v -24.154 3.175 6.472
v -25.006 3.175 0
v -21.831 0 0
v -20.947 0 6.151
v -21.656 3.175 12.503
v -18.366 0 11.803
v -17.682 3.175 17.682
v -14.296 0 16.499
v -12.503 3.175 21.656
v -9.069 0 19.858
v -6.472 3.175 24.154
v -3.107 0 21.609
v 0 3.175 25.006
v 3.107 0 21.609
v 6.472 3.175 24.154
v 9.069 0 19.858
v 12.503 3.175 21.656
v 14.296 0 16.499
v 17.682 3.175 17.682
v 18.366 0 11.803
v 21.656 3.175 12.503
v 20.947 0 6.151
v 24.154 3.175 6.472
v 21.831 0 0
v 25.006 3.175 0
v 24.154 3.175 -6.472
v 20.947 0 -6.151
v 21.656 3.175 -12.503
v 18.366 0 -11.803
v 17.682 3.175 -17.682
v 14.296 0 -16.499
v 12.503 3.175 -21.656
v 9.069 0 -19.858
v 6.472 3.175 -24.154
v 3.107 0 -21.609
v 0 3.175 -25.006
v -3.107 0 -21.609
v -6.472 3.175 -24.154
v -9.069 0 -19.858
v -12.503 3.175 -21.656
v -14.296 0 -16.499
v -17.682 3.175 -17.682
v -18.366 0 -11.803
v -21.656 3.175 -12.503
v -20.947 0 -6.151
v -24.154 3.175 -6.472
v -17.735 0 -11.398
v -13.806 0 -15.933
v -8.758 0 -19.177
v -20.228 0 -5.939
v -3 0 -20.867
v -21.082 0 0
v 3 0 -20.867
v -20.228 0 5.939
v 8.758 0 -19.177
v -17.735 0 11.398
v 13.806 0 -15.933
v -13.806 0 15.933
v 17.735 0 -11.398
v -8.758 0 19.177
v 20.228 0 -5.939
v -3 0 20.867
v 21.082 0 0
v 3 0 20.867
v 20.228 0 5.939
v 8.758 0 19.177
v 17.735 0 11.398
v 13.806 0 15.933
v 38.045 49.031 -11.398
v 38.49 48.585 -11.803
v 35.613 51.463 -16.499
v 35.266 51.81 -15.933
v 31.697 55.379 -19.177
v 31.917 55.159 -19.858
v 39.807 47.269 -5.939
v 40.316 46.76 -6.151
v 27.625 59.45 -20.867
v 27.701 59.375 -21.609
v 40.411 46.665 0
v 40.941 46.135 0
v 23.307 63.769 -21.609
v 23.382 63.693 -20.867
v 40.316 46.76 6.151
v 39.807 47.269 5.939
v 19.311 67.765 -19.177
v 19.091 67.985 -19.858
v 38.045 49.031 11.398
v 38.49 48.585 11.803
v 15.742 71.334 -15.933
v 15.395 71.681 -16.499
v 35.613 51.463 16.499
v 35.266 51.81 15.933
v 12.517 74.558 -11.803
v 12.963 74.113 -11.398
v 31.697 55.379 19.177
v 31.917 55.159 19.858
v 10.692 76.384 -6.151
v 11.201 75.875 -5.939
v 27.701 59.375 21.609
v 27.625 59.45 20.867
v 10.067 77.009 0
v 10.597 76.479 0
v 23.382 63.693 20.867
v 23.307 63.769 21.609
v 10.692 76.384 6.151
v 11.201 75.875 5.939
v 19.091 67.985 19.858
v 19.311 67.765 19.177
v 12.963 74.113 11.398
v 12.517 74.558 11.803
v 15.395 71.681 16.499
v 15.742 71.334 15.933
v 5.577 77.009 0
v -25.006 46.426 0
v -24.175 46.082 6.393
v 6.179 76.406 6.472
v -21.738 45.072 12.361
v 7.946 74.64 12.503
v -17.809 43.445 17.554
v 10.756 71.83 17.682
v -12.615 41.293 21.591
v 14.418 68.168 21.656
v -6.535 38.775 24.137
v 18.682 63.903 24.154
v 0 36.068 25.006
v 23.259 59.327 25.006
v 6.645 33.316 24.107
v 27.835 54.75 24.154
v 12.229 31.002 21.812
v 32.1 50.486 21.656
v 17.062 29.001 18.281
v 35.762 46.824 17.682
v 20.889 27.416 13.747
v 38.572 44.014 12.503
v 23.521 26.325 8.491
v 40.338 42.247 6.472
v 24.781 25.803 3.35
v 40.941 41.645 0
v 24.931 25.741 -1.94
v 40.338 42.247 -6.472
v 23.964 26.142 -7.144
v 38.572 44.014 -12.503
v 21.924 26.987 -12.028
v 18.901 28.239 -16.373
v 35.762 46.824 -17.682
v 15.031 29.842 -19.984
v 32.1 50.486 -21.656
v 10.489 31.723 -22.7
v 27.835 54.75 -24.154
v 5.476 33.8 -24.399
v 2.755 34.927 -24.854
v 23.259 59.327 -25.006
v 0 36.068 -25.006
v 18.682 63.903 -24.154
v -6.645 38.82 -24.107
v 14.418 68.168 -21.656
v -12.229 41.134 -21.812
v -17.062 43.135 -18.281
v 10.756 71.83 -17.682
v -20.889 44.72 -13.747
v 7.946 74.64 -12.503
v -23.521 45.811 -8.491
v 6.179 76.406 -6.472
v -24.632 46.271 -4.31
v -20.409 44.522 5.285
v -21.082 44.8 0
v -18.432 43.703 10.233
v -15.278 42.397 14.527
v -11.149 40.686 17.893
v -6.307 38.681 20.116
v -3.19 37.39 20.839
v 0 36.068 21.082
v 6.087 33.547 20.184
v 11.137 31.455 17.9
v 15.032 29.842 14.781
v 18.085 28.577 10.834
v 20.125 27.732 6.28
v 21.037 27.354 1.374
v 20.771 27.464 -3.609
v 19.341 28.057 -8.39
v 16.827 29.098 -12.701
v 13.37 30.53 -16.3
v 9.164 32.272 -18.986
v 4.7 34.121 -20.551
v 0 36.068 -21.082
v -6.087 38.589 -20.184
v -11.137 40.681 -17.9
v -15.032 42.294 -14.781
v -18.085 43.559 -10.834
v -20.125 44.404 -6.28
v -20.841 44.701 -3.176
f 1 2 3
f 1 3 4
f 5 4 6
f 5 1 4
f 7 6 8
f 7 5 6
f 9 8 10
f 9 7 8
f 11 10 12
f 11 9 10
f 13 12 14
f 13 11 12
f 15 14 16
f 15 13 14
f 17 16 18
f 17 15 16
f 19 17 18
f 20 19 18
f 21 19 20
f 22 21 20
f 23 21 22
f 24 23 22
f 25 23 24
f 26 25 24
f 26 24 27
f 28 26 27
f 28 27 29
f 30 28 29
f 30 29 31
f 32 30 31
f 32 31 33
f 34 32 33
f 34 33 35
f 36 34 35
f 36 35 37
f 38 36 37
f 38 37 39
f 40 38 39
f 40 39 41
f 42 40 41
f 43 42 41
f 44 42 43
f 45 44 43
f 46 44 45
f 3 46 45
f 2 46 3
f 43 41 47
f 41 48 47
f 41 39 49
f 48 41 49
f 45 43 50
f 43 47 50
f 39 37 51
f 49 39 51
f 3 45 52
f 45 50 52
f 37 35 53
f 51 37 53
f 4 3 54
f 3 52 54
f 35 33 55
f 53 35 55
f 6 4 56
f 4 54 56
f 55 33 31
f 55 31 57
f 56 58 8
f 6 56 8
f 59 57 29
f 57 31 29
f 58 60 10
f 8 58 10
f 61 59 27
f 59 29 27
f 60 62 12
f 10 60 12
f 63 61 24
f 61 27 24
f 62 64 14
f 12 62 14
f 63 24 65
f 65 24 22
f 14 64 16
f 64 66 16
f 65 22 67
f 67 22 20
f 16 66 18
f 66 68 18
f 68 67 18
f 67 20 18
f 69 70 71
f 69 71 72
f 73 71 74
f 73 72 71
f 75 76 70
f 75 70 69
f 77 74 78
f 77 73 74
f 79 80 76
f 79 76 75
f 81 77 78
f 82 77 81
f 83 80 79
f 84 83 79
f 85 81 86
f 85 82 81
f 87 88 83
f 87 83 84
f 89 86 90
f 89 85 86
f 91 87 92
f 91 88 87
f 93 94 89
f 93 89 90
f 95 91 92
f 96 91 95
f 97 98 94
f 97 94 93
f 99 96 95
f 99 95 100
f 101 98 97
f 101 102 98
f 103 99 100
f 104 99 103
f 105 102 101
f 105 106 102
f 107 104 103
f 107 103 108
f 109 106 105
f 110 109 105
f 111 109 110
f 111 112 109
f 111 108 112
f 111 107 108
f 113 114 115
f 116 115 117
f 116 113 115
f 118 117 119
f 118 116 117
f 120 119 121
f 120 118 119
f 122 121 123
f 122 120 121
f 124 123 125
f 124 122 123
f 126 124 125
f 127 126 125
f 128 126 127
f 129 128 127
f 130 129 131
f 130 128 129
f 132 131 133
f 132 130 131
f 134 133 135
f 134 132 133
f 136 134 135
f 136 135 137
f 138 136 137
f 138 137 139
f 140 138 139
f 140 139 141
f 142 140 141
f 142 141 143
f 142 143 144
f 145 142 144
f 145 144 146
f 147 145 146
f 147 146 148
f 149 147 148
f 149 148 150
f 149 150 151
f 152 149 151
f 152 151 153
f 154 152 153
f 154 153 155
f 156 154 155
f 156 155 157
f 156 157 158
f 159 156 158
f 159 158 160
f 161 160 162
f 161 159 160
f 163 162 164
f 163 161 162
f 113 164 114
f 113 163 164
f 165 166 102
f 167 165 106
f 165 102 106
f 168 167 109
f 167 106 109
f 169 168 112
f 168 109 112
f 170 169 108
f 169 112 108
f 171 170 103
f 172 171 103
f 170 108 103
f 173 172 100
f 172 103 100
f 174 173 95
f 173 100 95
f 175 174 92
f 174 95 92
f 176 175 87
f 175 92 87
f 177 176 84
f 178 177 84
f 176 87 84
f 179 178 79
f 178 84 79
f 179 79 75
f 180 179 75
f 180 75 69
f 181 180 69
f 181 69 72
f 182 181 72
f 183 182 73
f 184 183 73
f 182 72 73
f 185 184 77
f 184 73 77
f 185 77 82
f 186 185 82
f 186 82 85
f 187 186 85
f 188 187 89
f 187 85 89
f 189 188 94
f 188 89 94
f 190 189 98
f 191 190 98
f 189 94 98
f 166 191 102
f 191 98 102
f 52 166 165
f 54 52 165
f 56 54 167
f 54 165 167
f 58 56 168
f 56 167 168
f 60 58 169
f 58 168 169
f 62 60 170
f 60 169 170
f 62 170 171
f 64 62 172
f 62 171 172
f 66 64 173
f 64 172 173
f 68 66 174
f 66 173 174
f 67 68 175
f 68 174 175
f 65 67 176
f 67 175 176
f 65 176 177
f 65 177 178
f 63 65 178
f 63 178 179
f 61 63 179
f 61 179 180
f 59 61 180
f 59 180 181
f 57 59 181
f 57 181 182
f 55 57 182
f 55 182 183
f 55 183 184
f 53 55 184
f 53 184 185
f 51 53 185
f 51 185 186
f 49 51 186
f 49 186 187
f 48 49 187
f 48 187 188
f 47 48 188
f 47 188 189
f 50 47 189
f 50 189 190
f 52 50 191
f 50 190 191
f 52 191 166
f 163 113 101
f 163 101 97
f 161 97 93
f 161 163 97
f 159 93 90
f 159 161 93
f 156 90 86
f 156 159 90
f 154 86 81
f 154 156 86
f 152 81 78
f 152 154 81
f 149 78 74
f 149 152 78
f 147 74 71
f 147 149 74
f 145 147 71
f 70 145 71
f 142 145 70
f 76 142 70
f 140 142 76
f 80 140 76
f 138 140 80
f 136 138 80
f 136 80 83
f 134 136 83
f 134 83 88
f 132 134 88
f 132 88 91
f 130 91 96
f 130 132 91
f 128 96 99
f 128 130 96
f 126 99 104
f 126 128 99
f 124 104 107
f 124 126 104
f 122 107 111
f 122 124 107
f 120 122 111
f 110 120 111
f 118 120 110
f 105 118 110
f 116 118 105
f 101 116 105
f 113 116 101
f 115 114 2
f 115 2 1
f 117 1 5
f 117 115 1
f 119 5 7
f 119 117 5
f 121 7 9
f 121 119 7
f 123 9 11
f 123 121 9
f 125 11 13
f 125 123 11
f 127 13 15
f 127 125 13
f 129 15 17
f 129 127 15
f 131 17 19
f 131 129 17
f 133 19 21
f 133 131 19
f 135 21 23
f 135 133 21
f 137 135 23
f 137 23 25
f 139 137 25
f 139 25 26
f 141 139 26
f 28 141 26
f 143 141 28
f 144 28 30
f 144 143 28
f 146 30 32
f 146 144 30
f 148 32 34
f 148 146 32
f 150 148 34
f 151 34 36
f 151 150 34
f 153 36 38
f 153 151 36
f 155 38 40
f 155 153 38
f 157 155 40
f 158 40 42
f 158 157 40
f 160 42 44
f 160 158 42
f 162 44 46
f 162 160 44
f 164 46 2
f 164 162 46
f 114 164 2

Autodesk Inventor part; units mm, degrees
ref_plane "YZ Plane" through (0, 0, 0) normal (1, 0, 0) x (0, 1, 0)
ref_plane "XZ Plane" through (0, 0, 0) normal (0, 1, 0) x (-1, 0, 0)
ref_plane "XY Plane" through (0, 0, 0) normal (0, 0, 1) x (1, 0, 0)
sketch "Sketch1" plane through (0, 0, 0) normal (0, 1, 0) x (-1, 0, 0)
  circle A0 centre (0, 0) radius 25.0063
  circle A1 centre (0, 0) radius 21.082
  dimension "d0" = 50.0126
  dimension "d1" = 42.164
sketch "Sketch2" plane through (0, 0, 0) normal (0, 0, 1) x (1, 0, 0)
  line L0 (0, 0) -> (0, 36.068)
  line L1 (0, 36.068) -> (25.5039, 61.5719)
  line L2 (0, 36.068) -> (0, 32.2314) construction
  line L3 (-35.1083, 0) -> (35.606, 0) construction
  line L4 (25.0063, 0) -> (-25.0063, 0) construction
  dimension "d2" = 45
  dimension "d12" = 25.5039
  dimension "d13" = 36.068
  dimension "d14" = 61.5719
sweep "Sweep1" add profiles "Sketch1" path "Sketch2"
chamfer "Chamfer1" distance 3.175 angle 45 2 edges at (43.1861, 43.8898, 0) (25.0063, 0, 0)
equation "\"d12\" = 0.707107 * d13"
properties part number "Elbow 45degrees 1.25IN D" material "PVC-Piping"
